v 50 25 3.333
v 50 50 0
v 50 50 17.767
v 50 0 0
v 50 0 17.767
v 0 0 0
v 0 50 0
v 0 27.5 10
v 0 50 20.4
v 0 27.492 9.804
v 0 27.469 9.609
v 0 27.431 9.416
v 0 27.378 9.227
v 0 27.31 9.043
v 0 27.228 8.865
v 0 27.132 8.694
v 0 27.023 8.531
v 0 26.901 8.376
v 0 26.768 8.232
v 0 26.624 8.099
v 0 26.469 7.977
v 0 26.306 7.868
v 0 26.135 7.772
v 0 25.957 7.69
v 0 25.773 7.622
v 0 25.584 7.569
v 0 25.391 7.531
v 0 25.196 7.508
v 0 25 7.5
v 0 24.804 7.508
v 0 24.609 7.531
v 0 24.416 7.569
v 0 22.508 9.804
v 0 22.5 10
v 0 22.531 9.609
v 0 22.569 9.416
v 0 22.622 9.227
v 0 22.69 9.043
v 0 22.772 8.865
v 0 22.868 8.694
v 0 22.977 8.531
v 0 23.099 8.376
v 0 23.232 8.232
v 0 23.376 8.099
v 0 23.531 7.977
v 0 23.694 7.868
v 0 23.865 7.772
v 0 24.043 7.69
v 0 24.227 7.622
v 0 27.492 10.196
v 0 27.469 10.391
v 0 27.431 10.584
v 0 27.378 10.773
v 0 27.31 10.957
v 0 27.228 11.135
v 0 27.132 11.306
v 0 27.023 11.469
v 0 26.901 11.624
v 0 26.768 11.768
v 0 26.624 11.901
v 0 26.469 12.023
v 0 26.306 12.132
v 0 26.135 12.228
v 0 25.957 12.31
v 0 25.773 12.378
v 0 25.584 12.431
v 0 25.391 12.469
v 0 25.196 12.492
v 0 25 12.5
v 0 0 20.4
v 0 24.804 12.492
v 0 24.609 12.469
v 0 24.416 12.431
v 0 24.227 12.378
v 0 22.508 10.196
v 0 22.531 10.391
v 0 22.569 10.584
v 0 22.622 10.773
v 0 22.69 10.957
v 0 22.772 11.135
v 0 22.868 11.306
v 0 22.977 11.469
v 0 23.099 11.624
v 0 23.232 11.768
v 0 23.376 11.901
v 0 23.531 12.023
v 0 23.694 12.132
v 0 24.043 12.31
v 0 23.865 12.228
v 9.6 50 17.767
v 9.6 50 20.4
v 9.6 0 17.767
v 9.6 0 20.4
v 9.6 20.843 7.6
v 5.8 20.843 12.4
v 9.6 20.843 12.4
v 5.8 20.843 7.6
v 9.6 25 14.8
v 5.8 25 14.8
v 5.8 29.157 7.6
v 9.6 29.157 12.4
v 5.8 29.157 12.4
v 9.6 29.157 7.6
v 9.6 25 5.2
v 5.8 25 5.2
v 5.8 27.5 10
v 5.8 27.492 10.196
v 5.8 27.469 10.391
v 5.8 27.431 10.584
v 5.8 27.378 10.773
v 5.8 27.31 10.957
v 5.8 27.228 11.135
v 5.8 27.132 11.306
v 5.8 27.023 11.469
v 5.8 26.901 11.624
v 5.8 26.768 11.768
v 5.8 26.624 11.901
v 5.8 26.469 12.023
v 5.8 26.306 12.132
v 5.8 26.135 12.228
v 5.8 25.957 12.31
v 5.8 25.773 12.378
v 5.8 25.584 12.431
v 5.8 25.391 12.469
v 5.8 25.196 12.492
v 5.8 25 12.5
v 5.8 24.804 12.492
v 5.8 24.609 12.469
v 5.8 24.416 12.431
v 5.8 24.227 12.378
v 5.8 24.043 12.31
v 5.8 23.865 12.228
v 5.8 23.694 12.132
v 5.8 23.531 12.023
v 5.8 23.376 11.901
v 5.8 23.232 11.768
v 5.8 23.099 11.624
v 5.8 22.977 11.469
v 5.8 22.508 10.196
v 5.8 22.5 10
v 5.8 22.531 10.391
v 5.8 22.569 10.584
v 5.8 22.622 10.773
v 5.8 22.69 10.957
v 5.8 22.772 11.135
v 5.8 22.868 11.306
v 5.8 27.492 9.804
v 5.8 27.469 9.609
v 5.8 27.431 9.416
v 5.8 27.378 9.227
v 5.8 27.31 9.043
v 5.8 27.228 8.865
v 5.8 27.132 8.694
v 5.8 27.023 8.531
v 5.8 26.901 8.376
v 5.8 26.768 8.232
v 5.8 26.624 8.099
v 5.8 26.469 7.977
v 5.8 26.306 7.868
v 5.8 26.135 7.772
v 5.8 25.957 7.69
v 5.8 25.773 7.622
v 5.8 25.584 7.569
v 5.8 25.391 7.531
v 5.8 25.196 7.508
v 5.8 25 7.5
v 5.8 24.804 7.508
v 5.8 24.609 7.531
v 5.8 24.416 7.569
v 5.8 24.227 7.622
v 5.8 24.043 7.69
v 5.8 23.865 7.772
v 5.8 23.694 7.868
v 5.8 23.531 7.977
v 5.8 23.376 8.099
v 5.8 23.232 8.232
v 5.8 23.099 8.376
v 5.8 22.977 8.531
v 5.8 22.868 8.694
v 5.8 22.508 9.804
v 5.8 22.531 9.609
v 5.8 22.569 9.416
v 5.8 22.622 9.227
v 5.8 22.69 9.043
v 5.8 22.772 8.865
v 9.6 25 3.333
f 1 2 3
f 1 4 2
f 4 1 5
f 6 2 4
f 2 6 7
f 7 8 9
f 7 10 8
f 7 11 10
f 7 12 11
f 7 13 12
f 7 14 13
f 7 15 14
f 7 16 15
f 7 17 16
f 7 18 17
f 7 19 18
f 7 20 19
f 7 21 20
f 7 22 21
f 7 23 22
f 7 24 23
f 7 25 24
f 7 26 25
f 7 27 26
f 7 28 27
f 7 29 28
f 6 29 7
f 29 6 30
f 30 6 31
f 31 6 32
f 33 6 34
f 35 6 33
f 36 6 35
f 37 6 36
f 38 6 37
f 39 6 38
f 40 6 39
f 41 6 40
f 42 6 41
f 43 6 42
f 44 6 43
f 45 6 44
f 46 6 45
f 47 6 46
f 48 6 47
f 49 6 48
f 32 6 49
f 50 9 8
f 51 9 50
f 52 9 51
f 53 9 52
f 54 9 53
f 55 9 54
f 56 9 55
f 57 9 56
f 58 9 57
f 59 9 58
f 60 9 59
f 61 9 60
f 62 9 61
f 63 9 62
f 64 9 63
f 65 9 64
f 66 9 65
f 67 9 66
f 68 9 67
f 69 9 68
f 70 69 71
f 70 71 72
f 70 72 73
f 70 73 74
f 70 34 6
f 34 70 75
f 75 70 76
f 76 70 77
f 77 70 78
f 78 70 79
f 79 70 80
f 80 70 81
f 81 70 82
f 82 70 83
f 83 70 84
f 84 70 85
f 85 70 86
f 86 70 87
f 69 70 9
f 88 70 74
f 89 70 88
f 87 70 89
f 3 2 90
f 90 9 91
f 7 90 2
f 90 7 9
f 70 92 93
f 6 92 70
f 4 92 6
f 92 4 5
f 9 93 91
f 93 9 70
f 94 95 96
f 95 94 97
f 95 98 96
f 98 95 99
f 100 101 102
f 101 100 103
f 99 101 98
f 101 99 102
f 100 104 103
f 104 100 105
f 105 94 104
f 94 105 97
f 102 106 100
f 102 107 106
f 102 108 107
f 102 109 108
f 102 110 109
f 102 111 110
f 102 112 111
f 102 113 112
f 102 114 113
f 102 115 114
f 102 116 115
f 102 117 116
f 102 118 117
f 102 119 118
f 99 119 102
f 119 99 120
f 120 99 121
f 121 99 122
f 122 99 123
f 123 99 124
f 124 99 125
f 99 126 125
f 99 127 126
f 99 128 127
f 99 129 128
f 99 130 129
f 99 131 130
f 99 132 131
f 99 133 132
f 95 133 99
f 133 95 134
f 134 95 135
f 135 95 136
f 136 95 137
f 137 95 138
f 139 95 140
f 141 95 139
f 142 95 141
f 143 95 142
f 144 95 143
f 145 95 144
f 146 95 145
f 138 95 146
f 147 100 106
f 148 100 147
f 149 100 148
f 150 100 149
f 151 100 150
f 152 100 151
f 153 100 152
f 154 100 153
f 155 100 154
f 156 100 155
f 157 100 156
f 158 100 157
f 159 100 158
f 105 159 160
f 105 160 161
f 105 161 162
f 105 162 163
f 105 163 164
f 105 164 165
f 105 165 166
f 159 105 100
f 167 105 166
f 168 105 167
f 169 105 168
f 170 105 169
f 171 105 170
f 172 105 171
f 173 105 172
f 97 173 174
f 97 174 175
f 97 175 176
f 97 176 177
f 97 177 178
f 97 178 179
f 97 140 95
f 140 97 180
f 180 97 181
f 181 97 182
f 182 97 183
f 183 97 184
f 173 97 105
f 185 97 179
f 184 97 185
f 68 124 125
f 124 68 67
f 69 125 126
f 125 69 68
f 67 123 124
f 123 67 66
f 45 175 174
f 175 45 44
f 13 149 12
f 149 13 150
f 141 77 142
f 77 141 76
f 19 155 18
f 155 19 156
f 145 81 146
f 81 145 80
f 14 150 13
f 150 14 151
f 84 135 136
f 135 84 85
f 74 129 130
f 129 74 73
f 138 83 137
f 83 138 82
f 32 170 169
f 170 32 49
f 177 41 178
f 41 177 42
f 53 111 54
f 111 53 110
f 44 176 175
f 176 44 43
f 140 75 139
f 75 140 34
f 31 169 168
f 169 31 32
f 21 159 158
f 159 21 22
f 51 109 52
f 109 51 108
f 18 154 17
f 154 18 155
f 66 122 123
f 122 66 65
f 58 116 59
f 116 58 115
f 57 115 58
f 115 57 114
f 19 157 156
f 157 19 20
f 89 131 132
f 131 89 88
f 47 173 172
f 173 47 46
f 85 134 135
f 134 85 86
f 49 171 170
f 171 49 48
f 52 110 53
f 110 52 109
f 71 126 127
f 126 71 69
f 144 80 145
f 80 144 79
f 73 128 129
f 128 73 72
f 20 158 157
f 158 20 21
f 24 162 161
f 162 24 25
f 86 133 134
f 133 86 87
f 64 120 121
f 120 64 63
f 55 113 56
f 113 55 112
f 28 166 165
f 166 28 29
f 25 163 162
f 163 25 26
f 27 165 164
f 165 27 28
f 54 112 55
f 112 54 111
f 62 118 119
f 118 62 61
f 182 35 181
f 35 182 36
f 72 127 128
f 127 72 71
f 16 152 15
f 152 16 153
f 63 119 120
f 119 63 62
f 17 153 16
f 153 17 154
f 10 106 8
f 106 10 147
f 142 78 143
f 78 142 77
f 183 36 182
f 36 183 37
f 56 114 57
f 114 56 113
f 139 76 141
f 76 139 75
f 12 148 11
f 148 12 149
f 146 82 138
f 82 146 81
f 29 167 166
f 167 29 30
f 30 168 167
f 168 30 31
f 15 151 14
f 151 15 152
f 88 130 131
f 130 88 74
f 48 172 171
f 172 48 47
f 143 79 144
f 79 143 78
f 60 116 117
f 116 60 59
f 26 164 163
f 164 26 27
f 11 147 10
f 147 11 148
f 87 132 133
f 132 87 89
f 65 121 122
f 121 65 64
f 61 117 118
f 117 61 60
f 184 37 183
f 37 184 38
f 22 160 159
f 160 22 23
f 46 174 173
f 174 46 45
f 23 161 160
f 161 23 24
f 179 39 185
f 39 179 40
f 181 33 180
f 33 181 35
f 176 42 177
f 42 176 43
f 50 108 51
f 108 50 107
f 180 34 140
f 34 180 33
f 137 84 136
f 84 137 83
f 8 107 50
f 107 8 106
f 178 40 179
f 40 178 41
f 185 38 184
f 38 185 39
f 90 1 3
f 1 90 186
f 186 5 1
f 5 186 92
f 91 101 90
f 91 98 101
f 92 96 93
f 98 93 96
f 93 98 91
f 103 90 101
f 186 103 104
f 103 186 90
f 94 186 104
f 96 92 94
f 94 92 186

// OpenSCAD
// file: Modules.scad
/*
 * Jig to hold a model airplane while working on it.
 *
 * Vertical sections slide horizonally. Horizontal dimensions are scalable
 * by adding one or more extension bars.
 *
 * Wing supports clamp magnetically. Be sure to glue some felt on the
 * insides of the wing supports to protect the model
 *
 * ©Louis Kowolowski 2020
 */

module tail_holder () {
	translate ([3*bar_w, 0, 10]) {
		rotate ([0, 180, 0]) {
			tail_holder_bottom ();
		}
	}
	// height is +5 (thickness of top) because its been flipped over
	translate ([0, 0, -7]) {
		tail_holder_top ();
	}
}

module tail_holder_bottom () {
	difference () {
		cube ([3*bar_w, 1.5*bar_screw_head_d, bar_w/4]);

		union () {
			// screw/nut hole
			translate ([1.5*bar_w, 1.5*bar_screw_head_d+0.001, bar_w/8]) {
				rotate ([90, 0, 0]) {
					bar_screw ();
				}
			}
			// left magnet hole
			translate ([0.75*bar_screw_head_d, 1.5*bar_screw_d, bar_w/4-magnet_h+0.001]) {
				cylinder (magnet_h, d=magnet_d, $fn=80);
			}
			// right magnet hole
			translate ([(3*bar_w)-(0.75*bar_screw_head_d), 1.5*bar_screw_d, bar_w/4-magnet_h+0.001]) {
				cylinder (magnet_h, d=magnet_d, $fn=80);
			}
		}
	}
	// left side
	translate ([0, 1.5*bar_screw_head_d, 0]) {
		cube ([bar_w, bar_w, 5]);
	}

	// right side
	translate ([2*bar_w, 1.5*bar_screw_head_d, 0]) {
		cube ([bar_w, bar_w, 5]);
	}

}

module tail_holder_top () {

	difference () {
		cube ([3*bar_w, 1.5*bar_screw_head_d, 5]);
		union () {
			// left magnet hole
			translate ([0.75*bar_screw_head_d, 1.5*bar_screw_d, 5.001-magnet_h]) {
				cylinder (magnet_h, d=magnet_d, $fn=80);
			}
			// right magnet hole
			translate ([(3*bar_w)-(0.75*bar_screw_head_d), 1.5*bar_screw_d, 5.001-magnet_h]) {
				cylinder (magnet_h, d=magnet_d, $fn=80);
			}
		}
	}
	// left side
	translate ([0, 1.5*bar_screw_head_d, 0]) {
		cube ([bar_w, bar_w, 5]);
	}

	// right side
	translate ([2*bar_w, 1.5*bar_screw_head_d, 0]) {
		cube ([bar_w, bar_w, 5]);
	}
}

module nose_holder () {
	difference () {
		union () {
			cube ([bar_w, bar_w, 6]);
			translate ([0, 0, 6]) {
				// rear block to house screw/nut holder and magnets for top
				cube ([bar_screw_head_d, bar_w, 1.5*bar_screw_head_d]);
			}
			translate ([0, 0, 6]) {
				// rear block to house screw/nut holder and magnets for top
				cube ([bar_w, bar_w, 1.5*bar_screw_head_d]);
			}
		}
		union () {
			// screw/nut hole
			translate ([bar_screw_head_d+1, bar_w/2, 10]) {
				rotate ([0, 270, 0]) {
					bar_screw ();
				}
			}
			// angled cut to hold nose centered in jib
			translate ([bar_w/2+.5*bar_screw_head_d+0.001, bar_w/2, bar_w/2-5]) {
				rotate ([270, 210, 90]) {
					Triangle(a=bar_w, b=bar_w, angle=120, height=bar_w-bar_screw_head_d+0.001, centerXYZ=[true,true,true]);
				}
			}
			
		}
	}
}


module wing_holder () {
	wing_holder_bottom ();

	translate ([0, 0, 1.5*bar_screw_head_d+2]) {
		wing_holder_top ();
	}
}

module wing_holder_bottom () {
	// slides up and down the riser to hold the wing at the correct height
	difference () {
		union () {
			cube ([bar_w, bar_w, 6]);
			translate ([0, 0, 6]) {
				// rear block to house screw/nut holder and magnets for top
				// add 1 to height for room above the nut
				cube ([bar_screw_head_d, bar_w, bar_screw_head_d+1]);
			}
		}
		union () {
			// screw/nut hole
			translate ([bar_screw_head_d+1, bar_w/2, 11]) {
				rotate ([0, 270, 0]) {
					bar_screw ();
				}
			}
			// magnet mounting holes
			translate ([magnet_d/2+2, magnet_d, bar_screw_head_d+4.001]) {
				rotate ([0, 0, 90]) {
					cylinder (magnet_h, d=magnet_d, $fn=80);
				}
			}
			// magnet mounting holes
			translate ([magnet_d/2+2, bar_w-magnet_d, bar_screw_head_d+4.001]) {
				rotate ([0, 0, 90]) {
					cylinder (magnet_h, d=magnet_d, $fn=80);
				}
			}
		}
	}
}

module wing_holder_top () {
	difference () {
		cube ([bar_w, bar_w, 6]);
		union () {
			// magnet mounting holes
			translate ([bar_w-magnet_d, magnet_d, -1*0.001]) {
				rotate ([0, 0, 90]) {
					cylinder (magnet_h, d=magnet_d, $fn=80);
				}
			}
			// magnet mounting holes
			translate ([bar_w-magnet_d, bar_w-magnet_d, -1*0.001]) {
				rotate ([0, 0, 90]) {
					cylinder (magnet_h, d=magnet_d, $fn=80);
				}
			}
		}
	}
}

module riser () {
	/* vertical bar that will slide forward/backward on the base and hold the
	 * horizontal rest(s) for the model
	 */
	difference () {
		// base
		cube ([riser_w, riser_w, riser_w/4]);	
		union () {
			// slot at bottom for guide on bar
			translate ([riser_w/4, -1*0.001, -1*0.01]) {
				cube ([riser_w/2, riser_w+1, 5.01]);
			}
			// cross slot at bottom for guide on bar
			translate ([-0.001, riser_w/4, -1*0.01]) {
				cube ([riser_w+1, riser_w/2, 5.01]);
			}
			// screw hole
			translate ([riser_w/2, riser_w/2, -1*bar_screw_head_h]) {
				bar_screw ();
			}
		}
	}
	difference () {
		// vartical riser
		translate ([0, 0, riser_w/4]) {
			cube ([riser_w, riser_w/8, riser_l]);
		}
		// screw slot
		translate ([riser_w/2-bar_screw_d/2, -1, riser_w]) {
			cube ([bar_screw_d, riser_w/4+1, riser_l-riser_w]);
		}
	}
}

module bar_screw () {
	// Model of a screw and hex head/nut

	// screw head
	cylinder(bar_screw_head_h, d=bar_screw_head_d, $fn=6);
	translate ([0, 0, 0]) {
		// screw body
		cylinder(bar_screw_h, d=bar_screw_d, $fn=80);
	}
}

module bar () {
	/* lower base unit. Comes together as a cross. Each bar can be extended with
	 * additional bars.
	 * Raised section acts as a guide for the riser. Slot down the middle is for
	 * a clamping butterfly screw.
	 */
	difference () {
		union () {
			cube ([bar_l, bar_w, bar_h]);
			translate ([0, bar_w/4, 0]) {
				// guide slot
				cube ([bar_l, bar_w/2, bar_h+5]);
			}
		}
		translate ([1, bar_w/2-bar_screw_d/2, -0.001]) {
			cube ([bar_l-2, bar_screw_d, bar_screw_h]);
		}
		translate ([1, bar_w/2-bar_screw_head_d/2, -0.001]) {
			 cube ([bar_l, bar_screw_head_d, bar_screw_head_h+1]);
		}
	}
	// upper extension
	difference () {
		translate ([bar_l, 0, bar_h/2]) {
			cube ([bar_w/4, bar_w, bar_h/2]);
		}
		union () {
			// 2 screw holes
			// left
			translate ([bar_l+bar_w/8, bar_w/8, -1*0.001]) {
				bar_screw ();
			}
			// right
			translate ([bar_l+bar_w/8, bar_w-bar_w/8, -1*0.001]) {
				bar_screw ();
			}
		}
	}
	// lower extension
	difference () {
		translate ([-1*bar_w/4, 0, 0]) {
			cube ([bar_w/4, bar_w, bar_h/2]);
		}
		union () {
			// 2 screw holes
			// left
			translate ([-1*bar_w/4+bar_w/8, bar_w/8, -1*0.001]) {
				bar_screw ();
			}
			// right
			translate ([-1*bar_w/4+bar_w/8, bar_w-bar_w/8, -1*0.001]) {
				bar_screw ();
			}
		}
	}

}

module Triangle(
			a, b, angle, height=1, heights=undef,
			center=undef, centerXYZ=[false,false,false]) {
	// Calculate Heights at each point
	heightAB = ((heights==undef) ? height : heights[0])/2;
	heightBC = ((heights==undef) ? height : heights[1])/2;
	heightCA = ((heights==undef) ? height : heights[2])/2;
	centerZ = (center || (center==undef && centerXYZ[2]))?0:max(heightAB,heightBC,heightCA);

	// Calculate Offsets for centering
	offsetX = (center || (center==undef && centerXYZ[0]))?((cos(angle)*a)+b)/3:0;
	offsetY = (center || (center==undef && centerXYZ[1]))?(sin(angle)*a)/3:0;
	
	pointAB1 = [-offsetX,-offsetY, centerZ-heightAB];
	pointAB2 = [-offsetX,-offsetY, centerZ+heightAB];
	pointBC1 = [b-offsetX,-offsetY, centerZ-heightBC];
	pointBC2 = [b-offsetX,-offsetY, centerZ+heightBC];
	pointCA1 = [(cos(angle)*a)-offsetX,(sin(angle)*a)-offsetY, centerZ-heightCA];
	pointCA2 = [(cos(angle)*a)-offsetX,(sin(angle)*a)-offsetY, centerZ+heightCA];

	polyhedron(
		points=[	pointAB1, pointBC1, pointCA1,
					pointAB2, pointBC2, pointCA2 ],
		faces=[	
			[0, 1, 2],
			[3, 5, 4],
			[0, 3, 1],
			[1, 3, 4],
			[1, 4, 2],
			[2, 4, 5],
			[2, 5, 0],
			[0, 5, 3] ] );
}
// file: Globals.scad
/*
 * Global variables used for all the models
 * All units are in mm
 *
 * Jig to hold a model airplane while working on it.
 *
 * Vertical sections slide horizonally. Horizontal dimensions are scalable
 * by adding one or more extension bars.
 *
 * Wing supports clamp magnetically. Be sure to glue some felt on the
 * insides of the wing supports to protect the model
 *
 * ©Louis Kowolowski 2020
 */

/* long dimensions are constrained by the size of the print bed
 */
bar_l = 175;
bar_w = 50;
bar_h = 13;

riser_l = 150;
riser_w = 50;
riser_h = 12;

// M5x20
bar_screw_head_h = 4.8;
bar_screw_head_d = 9.6;
bar_screw_h = 20;
bar_screw_d = 5;

guide_rail_l = bar_l;
guide_rail_w = bar_w/2;
guide_rail_h = 2;

magnet_h = 3;
magnet_d = 5;
// main file
/*
 * Jig to hold a model airplane while working on it.
 *
 * Vertical sections slide horizonally. Horizontal dimensions are scalable
 * by adding one or more extension bars.
 *
 * Wing supports clamp magnetically. Be sure to glue some felt on the
 * insides of the wing supports to protect the model
 *
 * ©Louis Kowolowski 2020
 */

/*
 * Include globals and modules
 */
include <Globals.scad>;
include <Modules.scad>;

nose_holder ();
